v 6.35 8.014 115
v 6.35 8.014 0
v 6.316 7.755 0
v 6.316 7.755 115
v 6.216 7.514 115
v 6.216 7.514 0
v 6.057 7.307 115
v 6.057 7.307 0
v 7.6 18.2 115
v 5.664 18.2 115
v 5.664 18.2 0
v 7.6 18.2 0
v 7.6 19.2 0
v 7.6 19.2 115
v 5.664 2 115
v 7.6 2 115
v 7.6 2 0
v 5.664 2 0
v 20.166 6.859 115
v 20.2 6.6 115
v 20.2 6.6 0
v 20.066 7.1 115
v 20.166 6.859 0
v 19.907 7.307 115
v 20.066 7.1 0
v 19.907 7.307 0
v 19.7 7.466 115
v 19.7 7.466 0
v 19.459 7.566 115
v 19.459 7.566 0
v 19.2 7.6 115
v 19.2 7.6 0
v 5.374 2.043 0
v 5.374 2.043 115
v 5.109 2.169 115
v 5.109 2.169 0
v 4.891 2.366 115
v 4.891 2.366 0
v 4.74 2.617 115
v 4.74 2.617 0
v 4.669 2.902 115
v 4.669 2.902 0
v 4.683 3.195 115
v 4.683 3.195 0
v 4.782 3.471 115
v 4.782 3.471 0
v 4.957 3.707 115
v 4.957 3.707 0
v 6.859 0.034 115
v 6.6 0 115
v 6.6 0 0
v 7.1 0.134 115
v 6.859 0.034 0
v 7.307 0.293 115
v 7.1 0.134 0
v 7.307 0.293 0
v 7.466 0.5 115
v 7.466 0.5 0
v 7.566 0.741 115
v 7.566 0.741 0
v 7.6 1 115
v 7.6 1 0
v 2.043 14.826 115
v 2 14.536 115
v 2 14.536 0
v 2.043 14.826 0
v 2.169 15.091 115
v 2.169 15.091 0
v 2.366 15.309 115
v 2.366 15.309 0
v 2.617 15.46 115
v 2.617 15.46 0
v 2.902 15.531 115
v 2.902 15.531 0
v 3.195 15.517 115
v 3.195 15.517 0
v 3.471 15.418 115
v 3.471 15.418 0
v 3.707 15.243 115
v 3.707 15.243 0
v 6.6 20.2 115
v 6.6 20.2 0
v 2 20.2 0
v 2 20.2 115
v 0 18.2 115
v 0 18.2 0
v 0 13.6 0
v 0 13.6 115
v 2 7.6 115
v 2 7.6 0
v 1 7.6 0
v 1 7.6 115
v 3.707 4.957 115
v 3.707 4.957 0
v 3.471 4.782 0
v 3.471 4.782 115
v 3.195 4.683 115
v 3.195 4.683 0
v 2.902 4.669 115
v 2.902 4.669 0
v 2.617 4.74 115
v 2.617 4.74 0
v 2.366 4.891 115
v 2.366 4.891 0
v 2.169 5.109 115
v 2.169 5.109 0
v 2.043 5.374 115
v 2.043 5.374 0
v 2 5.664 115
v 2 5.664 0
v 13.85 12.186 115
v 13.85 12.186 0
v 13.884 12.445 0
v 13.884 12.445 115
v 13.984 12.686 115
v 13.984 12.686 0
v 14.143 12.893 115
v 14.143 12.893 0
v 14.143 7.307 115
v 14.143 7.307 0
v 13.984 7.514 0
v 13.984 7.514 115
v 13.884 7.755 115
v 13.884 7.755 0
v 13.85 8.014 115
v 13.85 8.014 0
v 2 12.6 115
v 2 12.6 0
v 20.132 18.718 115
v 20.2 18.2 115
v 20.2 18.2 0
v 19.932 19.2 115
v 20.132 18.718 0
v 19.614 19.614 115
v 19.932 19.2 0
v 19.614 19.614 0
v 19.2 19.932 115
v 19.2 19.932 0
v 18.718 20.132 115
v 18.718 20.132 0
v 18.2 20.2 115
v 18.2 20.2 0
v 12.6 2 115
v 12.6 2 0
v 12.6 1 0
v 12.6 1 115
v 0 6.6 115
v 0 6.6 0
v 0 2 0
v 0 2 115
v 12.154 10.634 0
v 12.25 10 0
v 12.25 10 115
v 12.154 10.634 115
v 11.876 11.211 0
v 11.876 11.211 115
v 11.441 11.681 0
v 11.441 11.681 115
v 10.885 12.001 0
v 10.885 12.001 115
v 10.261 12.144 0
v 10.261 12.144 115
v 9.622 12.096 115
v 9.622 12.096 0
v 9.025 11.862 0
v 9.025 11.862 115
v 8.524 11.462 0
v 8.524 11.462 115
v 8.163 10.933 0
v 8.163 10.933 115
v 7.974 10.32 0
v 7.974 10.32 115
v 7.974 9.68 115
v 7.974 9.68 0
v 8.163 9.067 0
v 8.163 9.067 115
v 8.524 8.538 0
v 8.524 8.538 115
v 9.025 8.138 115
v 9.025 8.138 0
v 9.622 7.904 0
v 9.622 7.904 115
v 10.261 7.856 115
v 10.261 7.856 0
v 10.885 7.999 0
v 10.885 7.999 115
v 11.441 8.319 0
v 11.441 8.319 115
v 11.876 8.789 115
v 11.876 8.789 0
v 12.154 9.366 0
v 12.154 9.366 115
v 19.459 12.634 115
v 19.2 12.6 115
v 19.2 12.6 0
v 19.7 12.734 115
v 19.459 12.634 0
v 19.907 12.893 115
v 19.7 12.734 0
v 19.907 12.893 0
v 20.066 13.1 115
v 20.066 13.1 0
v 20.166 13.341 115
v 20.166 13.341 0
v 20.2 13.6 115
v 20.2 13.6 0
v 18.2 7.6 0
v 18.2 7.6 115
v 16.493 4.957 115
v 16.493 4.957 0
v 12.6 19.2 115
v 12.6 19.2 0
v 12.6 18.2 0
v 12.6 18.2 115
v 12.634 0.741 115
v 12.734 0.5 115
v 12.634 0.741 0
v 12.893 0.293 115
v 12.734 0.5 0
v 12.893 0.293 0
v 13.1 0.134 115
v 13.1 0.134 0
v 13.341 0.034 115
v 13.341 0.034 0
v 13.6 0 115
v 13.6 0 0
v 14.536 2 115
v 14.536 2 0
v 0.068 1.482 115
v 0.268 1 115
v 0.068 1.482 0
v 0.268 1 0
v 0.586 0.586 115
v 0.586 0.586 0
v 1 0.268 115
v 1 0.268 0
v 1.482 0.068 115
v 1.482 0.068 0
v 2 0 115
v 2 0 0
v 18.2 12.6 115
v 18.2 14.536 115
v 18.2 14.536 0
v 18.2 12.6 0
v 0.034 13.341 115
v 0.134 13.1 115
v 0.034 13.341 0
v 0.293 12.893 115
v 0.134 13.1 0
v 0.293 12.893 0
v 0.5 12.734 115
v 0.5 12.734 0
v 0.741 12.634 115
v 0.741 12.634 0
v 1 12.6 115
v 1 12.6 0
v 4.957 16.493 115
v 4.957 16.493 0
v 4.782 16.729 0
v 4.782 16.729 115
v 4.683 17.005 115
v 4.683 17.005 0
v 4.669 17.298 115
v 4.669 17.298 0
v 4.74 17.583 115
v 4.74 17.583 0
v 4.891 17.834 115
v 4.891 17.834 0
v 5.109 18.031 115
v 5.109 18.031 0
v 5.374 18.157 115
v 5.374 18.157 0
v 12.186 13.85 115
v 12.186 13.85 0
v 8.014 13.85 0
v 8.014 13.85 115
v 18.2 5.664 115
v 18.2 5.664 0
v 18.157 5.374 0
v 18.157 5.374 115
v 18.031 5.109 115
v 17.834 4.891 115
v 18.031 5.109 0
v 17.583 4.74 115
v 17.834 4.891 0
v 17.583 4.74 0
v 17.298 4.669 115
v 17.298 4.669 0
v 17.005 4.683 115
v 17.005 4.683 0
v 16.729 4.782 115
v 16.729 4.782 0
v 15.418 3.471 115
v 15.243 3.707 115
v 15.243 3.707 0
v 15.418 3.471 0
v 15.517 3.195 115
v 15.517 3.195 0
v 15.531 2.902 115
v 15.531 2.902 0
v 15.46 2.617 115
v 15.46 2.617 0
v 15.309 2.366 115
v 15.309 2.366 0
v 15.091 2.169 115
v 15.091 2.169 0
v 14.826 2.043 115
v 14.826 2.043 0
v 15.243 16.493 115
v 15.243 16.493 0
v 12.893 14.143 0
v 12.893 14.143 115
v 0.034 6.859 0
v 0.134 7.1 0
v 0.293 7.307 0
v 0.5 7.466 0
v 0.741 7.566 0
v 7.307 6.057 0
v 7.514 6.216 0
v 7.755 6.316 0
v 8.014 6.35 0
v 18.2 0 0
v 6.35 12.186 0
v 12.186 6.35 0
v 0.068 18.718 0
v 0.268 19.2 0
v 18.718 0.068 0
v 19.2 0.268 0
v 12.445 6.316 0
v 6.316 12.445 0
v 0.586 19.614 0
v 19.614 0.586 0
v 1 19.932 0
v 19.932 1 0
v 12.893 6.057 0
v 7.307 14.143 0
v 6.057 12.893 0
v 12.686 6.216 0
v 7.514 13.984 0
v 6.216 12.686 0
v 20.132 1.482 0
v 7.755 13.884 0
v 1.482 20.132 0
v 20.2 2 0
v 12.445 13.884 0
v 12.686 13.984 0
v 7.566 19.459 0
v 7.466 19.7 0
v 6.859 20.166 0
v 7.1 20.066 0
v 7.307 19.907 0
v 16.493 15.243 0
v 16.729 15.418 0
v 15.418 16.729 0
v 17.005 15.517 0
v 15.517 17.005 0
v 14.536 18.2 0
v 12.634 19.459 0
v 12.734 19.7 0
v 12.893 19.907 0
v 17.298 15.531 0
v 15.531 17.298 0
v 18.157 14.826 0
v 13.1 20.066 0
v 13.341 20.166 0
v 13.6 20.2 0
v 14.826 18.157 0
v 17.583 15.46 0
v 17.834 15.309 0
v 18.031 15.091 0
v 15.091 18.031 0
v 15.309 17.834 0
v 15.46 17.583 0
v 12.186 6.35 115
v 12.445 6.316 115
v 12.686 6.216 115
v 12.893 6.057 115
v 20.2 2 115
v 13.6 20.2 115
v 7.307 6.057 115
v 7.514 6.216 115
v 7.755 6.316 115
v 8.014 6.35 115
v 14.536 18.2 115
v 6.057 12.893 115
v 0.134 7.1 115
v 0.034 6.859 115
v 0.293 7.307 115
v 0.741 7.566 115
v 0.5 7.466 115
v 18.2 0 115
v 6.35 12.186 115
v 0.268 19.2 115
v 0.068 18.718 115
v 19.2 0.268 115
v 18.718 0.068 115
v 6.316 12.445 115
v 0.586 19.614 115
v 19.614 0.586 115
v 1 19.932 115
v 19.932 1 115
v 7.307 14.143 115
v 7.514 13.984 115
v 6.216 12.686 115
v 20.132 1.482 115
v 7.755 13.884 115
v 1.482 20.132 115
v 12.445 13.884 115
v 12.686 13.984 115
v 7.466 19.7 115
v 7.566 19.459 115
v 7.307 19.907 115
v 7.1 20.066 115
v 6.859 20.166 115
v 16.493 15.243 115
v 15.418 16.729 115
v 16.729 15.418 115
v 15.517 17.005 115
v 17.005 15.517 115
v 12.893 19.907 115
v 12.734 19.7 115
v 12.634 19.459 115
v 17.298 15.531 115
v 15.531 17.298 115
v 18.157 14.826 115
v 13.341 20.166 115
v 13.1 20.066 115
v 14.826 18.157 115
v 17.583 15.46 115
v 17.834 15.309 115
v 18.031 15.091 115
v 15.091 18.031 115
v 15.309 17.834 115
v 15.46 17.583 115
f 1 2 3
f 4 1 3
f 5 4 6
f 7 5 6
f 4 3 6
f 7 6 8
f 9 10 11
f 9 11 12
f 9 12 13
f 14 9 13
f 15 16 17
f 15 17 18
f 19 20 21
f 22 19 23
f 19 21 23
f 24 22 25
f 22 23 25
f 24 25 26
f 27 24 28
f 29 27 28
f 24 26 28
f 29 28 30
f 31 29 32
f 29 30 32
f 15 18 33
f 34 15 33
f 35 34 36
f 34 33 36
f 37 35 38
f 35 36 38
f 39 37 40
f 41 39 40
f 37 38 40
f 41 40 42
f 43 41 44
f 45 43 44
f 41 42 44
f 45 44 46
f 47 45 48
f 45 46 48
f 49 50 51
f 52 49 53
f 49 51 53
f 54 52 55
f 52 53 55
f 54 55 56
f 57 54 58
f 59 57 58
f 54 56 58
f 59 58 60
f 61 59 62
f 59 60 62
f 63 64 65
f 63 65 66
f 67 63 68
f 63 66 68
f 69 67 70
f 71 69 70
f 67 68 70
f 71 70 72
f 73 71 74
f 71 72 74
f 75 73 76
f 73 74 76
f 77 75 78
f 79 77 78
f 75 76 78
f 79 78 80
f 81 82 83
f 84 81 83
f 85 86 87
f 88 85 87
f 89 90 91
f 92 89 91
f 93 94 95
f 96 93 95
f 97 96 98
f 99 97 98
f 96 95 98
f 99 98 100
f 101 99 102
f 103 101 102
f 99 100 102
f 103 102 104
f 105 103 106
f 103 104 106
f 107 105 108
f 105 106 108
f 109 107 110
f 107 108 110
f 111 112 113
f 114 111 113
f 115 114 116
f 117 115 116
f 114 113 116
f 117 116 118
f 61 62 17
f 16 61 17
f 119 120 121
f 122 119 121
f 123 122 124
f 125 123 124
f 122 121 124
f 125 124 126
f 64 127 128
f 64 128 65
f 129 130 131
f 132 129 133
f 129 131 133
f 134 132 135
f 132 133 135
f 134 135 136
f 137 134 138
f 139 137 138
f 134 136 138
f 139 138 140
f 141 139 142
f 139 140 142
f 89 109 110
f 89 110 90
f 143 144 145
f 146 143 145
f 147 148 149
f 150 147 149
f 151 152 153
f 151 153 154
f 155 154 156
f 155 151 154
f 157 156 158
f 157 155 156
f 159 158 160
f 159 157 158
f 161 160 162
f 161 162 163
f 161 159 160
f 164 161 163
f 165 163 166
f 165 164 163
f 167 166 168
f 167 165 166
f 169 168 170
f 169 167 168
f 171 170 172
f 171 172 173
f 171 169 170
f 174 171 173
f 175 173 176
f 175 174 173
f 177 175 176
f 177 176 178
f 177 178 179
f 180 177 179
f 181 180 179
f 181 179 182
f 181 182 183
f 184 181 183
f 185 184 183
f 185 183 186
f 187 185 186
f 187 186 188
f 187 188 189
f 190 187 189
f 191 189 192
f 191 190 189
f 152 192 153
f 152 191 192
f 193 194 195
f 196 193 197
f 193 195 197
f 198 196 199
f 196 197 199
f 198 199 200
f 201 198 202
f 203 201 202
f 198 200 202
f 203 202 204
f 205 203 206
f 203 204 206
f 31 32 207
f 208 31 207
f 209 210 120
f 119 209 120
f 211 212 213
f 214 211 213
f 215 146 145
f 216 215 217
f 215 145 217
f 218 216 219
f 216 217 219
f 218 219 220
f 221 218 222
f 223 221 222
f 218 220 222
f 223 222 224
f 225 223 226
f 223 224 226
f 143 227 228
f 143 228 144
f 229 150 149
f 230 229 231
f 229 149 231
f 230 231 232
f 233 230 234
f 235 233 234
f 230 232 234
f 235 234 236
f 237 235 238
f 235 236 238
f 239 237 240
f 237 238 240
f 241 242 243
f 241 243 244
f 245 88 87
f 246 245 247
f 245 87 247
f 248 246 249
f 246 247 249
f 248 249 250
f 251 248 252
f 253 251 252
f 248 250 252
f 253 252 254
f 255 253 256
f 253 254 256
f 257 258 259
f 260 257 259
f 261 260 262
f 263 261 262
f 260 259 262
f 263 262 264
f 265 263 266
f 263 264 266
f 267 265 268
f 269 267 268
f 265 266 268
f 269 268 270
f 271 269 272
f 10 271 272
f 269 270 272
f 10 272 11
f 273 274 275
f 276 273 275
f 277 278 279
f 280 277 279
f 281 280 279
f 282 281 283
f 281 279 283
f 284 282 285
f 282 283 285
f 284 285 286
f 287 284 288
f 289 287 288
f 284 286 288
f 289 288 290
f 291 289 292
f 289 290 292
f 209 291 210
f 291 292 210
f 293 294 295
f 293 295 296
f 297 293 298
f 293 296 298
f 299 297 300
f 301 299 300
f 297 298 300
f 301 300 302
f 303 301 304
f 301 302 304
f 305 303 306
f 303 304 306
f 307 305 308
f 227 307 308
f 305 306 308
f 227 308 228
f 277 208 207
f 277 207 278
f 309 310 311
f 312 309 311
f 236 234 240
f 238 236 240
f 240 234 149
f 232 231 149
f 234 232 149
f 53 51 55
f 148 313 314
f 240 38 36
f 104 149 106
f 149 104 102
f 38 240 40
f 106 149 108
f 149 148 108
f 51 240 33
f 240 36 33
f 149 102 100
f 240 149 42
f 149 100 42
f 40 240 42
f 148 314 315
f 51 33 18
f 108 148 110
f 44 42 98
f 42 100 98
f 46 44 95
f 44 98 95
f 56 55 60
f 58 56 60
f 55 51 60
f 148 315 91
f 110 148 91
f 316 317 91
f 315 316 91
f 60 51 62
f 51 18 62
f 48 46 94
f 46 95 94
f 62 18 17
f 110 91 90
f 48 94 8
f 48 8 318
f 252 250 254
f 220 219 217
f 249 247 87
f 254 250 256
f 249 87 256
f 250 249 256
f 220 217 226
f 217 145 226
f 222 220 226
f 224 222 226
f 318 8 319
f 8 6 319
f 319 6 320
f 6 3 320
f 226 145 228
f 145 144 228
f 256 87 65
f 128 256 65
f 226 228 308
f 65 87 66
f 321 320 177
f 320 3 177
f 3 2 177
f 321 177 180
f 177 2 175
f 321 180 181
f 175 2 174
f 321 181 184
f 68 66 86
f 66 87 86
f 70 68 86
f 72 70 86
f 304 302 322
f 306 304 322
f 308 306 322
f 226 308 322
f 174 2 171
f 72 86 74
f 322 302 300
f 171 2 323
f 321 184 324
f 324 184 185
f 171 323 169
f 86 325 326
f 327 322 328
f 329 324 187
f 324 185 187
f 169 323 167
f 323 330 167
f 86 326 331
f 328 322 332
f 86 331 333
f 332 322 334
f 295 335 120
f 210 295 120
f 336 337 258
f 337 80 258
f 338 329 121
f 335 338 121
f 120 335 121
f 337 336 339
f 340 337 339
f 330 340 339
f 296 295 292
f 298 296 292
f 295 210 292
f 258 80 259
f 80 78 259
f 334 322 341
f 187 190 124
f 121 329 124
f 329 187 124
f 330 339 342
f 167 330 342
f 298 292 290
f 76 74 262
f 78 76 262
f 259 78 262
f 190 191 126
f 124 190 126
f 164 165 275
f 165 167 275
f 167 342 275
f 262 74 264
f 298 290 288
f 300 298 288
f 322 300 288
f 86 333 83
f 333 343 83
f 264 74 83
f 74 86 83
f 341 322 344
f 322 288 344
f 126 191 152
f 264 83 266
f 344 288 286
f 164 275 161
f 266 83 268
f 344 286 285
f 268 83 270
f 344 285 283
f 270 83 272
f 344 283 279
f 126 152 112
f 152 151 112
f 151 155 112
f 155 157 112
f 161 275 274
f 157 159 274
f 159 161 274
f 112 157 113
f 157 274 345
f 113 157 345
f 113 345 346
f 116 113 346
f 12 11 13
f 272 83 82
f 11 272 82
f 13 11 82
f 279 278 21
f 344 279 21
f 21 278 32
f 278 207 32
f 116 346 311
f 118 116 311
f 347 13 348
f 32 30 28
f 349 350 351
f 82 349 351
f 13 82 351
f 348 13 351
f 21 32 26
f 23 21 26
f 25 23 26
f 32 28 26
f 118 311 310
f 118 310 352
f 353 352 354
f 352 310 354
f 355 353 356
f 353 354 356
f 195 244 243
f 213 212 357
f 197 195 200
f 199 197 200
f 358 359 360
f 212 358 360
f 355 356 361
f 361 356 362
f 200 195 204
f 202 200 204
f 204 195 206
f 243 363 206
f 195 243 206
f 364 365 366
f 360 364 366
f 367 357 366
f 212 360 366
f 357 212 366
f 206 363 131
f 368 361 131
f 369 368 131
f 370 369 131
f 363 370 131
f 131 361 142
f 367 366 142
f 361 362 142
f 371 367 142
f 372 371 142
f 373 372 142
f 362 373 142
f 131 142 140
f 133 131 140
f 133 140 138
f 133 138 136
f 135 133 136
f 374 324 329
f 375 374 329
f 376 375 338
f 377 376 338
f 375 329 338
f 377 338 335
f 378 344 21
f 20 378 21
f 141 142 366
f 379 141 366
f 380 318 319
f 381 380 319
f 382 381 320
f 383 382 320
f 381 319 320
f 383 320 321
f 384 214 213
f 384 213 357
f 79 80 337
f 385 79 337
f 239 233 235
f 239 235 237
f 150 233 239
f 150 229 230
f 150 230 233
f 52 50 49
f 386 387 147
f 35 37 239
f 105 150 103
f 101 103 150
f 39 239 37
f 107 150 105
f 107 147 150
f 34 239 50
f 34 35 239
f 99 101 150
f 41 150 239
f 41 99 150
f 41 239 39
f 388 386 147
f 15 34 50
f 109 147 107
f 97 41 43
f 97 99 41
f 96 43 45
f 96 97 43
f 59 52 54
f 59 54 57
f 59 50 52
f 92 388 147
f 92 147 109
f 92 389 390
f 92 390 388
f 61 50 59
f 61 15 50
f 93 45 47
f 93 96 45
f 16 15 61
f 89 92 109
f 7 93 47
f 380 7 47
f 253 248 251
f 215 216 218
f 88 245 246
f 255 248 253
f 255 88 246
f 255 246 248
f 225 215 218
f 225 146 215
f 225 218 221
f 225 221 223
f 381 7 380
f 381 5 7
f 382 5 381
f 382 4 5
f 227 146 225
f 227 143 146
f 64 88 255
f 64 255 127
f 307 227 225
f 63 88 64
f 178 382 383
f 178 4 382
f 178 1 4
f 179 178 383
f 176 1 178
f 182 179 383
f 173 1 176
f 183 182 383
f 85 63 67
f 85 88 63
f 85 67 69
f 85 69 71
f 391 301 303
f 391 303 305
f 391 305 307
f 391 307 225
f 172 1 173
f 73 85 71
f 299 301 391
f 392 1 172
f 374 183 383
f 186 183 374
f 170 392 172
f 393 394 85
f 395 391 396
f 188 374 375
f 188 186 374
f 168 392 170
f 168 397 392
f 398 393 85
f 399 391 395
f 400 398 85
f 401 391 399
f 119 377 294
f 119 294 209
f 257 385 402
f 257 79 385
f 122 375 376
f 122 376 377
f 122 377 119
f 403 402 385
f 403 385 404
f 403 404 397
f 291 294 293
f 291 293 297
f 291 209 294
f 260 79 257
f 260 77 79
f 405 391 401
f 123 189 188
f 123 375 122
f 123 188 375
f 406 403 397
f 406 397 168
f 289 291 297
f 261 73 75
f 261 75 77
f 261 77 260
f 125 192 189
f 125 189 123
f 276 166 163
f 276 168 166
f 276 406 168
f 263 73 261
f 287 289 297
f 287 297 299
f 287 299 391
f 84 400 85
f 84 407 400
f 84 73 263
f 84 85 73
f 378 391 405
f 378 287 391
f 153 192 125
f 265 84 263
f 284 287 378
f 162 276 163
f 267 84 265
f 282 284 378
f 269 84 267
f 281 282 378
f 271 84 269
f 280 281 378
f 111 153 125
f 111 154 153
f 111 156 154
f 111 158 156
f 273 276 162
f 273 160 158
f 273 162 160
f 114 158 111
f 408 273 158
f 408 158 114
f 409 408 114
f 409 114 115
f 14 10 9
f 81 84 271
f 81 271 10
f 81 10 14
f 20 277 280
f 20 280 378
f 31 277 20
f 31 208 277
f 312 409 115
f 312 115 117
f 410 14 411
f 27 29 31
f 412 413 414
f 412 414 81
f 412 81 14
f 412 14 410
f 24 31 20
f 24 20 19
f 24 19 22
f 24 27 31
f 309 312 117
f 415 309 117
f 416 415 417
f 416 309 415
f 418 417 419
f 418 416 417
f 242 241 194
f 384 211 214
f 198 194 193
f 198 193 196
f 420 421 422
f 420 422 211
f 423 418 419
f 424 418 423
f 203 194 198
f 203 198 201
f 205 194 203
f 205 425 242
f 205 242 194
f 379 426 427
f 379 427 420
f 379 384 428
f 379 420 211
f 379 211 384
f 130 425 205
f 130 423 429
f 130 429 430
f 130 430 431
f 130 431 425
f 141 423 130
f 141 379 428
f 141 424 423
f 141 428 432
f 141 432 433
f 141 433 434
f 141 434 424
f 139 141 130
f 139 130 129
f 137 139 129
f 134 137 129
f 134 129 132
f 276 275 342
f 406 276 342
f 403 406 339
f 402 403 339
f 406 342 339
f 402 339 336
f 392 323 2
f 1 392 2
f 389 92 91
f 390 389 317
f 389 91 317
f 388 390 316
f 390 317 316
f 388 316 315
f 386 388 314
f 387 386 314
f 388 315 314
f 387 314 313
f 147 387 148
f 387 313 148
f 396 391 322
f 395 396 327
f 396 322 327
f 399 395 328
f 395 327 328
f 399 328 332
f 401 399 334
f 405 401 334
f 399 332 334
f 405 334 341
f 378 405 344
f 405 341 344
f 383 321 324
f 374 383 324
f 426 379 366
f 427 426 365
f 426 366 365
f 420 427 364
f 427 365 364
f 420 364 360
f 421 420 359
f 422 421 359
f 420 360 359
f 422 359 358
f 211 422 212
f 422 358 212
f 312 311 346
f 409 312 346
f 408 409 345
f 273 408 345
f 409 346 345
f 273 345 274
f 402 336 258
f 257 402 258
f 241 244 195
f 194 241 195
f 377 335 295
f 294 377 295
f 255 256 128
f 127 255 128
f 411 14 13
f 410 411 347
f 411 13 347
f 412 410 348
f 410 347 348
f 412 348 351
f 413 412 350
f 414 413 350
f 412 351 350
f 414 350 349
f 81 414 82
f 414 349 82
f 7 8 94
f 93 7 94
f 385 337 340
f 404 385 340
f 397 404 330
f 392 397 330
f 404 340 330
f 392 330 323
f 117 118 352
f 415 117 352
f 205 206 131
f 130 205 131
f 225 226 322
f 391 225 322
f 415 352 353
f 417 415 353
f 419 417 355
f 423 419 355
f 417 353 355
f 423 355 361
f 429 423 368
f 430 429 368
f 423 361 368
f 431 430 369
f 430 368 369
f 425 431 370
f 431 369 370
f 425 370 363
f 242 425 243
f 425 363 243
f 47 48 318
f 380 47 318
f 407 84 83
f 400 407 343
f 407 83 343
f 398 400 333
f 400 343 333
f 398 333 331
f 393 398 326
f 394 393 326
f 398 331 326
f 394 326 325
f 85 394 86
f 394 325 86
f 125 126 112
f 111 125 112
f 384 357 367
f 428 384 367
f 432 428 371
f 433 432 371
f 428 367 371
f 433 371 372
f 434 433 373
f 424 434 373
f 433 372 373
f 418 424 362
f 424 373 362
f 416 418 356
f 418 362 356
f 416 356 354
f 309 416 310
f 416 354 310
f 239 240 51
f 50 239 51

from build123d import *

# Parameters (mm, degrees)
SKETCH1_R           = 2.15
BOSS_EXTRUDE1_DEPTH = 115


with BuildPart() as part:
    # Sketch1 → Boss-Extrude1 (new body)
    with BuildSketch(Plane.XY):
        with BuildLine():
            Line((2, 0), (6.6, 0))
            ThreePointArc((6.6, 0), (7.307106781, 0.292893219), (7.6, 1))
            Line((7.6, 1), (7.6, 2))
            Line((7.6, 2), (5.664213562, 2))
            ThreePointArc((5.664213562, 2), (4.74033403, 2.617316568), (4.957106781, 3.707106781))
            Line((4.957106781, 3.707106781), (7.307106781, 6.057106781))
            ThreePointArc((7.307106781, 6.057106781), (7.63153013, 6.273879533), (8.014213562, 6.35))
            Line((8.014213562, 6.35), (12.185786438, 6.35))
            ThreePointArc((12.185786438, 6.35), (12.56846987, 6.273879533), (12.892893219, 6.057106781))
            Line((12.892893219, 6.057106781), (15.242893219, 3.707106781))
            ThreePointArc((15.242893219, 3.707106781), (15.45966597, 2.617316568), (14.535786438, 2))
            Line((14.535786438, 2), (12.6, 2))
            Line((12.6, 2), (12.6, 1))
            ThreePointArc((12.6, 1), (12.892893219, 0.292893219), (13.6, 0))
            Line((13.6, 0), (18.2, 0))
            ThreePointArc((18.2, 0), (19.614213562, 0.585786438), (20.2, 2))
            Line((20.2, 2), (20.2, 6.6))
            ThreePointArc((20.2, 6.6), (19.907106781, 7.307106781), (19.2, 7.6))
            Line((19.2, 7.6), (18.2, 7.6))
            Line((18.2, 7.6), (18.2, 5.664213562))
            ThreePointArc((18.2, 5.664213562), (17.582683432, 4.74033403), (16.492893219, 4.957106781))
            Line((16.492893219, 4.957106781), (14.142893219, 7.307106781))
            ThreePointArc((14.142893219, 7.307106781), (13.926120467, 7.63153013), (13.85, 8.014213562))
            Line((13.85, 8.014213562), (13.85, 12.185786438))
            ThreePointArc((13.85, 12.185786438), (13.926120467, 12.56846987), (14.142893219, 12.892893219))
            Line((14.142893219, 12.892893219), (16.492893219, 15.242893219))
            ThreePointArc((16.492893219, 15.242893219), (17.582683432, 15.45966597), (18.2, 14.535786438))
            Line((18.2, 14.535786438), (18.2, 12.6))
            Line((18.2, 12.6), (19.2, 12.6))
            ThreePointArc((19.2, 12.6), (19.907106781, 12.892893219), (20.2, 13.6))
            Line((20.2, 13.6), (20.2, 18.2))
            ThreePointArc((20.2, 18.2), (19.614213562, 19.614213562), (18.2, 20.2))
            Line((18.2, 20.2), (13.6, 20.2))
            ThreePointArc((13.6, 20.2), (12.892893219, 19.907106781), (12.6, 19.2))
            Line((12.6, 19.2), (12.6, 18.2))
            Line((12.6, 18.2), (14.535786438, 18.2))
            ThreePointArc((14.535786438, 18.2), (15.45966597, 17.582683432), (15.242893219, 16.492893219))
            Line((15.242893219, 16.492893219), (12.892893219, 14.142893219))
            ThreePointArc((12.892893219, 14.142893219), (12.56846987, 13.926120467), (12.185786438, 13.85))
            Line((12.185786438, 13.85), (8.014213562, 13.85))
            ThreePointArc((8.014213562, 13.85), (7.63153013, 13.926120467), (7.307106781, 14.142893219))
            Line((7.307106781, 14.142893219), (4.957106781, 16.492893219))
            ThreePointArc((4.957106781, 16.492893219), (4.74033403, 17.582683432), (5.664213562, 18.2))
            Line((5.664213562, 18.2), (7.6, 18.2))
            Line((7.6, 18.2), (7.6, 19.2))
            ThreePointArc((7.6, 19.2), (7.307106781, 19.907106781), (6.6, 20.2))
            Line((6.6, 20.2), (2, 20.2))
            ThreePointArc((2, 20.2), (0.585786438, 19.614213562), (0, 18.2))
            Line((0, 18.2), (0, 13.6))
            ThreePointArc((0, 13.6), (0.292893219, 12.892893219), (1, 12.6))
            Line((1, 12.6), (2, 12.6))
            Line((2, 12.6), (2, 14.535786438))
            ThreePointArc((2, 14.535786438), (2.617316568, 15.45966597), (3.707106781, 15.242893219))
            Line((3.707106781, 15.242893219), (6.057106781, 12.892893219))
            ThreePointArc((6.057106781, 12.892893219), (6.273879533, 12.56846987), (6.35, 12.185786438))
            Line((6.35, 12.185786438), (6.35, 8.014213562))
            ThreePointArc((6.35, 8.014213562), (6.273879533, 7.63153013), (6.057106781, 7.307106781))
            Line((6.057106781, 7.307106781), (3.707106781, 4.957106781))
            ThreePointArc((3.707106781, 4.957106781), (2.617316568, 4.74033403), (2, 5.664213562))
            Line((2, 5.664213562), (2, 7.6))
            Line((2, 7.6), (1, 7.6))
            ThreePointArc((1, 7.6), (0.292893219, 7.307106781), (0, 6.6))
            Line((0, 6.6), (0, 2))
            ThreePointArc((0, 2), (0.585786438, 0.585786438), (2, 0))
        make_face()
        with Locations((10.1, 10)):
            Circle(SKETCH1_R, mode=Mode.SUBTRACT)
    extrude(amount=BOSS_EXTRUDE1_DEPTH)


solid = part.part
